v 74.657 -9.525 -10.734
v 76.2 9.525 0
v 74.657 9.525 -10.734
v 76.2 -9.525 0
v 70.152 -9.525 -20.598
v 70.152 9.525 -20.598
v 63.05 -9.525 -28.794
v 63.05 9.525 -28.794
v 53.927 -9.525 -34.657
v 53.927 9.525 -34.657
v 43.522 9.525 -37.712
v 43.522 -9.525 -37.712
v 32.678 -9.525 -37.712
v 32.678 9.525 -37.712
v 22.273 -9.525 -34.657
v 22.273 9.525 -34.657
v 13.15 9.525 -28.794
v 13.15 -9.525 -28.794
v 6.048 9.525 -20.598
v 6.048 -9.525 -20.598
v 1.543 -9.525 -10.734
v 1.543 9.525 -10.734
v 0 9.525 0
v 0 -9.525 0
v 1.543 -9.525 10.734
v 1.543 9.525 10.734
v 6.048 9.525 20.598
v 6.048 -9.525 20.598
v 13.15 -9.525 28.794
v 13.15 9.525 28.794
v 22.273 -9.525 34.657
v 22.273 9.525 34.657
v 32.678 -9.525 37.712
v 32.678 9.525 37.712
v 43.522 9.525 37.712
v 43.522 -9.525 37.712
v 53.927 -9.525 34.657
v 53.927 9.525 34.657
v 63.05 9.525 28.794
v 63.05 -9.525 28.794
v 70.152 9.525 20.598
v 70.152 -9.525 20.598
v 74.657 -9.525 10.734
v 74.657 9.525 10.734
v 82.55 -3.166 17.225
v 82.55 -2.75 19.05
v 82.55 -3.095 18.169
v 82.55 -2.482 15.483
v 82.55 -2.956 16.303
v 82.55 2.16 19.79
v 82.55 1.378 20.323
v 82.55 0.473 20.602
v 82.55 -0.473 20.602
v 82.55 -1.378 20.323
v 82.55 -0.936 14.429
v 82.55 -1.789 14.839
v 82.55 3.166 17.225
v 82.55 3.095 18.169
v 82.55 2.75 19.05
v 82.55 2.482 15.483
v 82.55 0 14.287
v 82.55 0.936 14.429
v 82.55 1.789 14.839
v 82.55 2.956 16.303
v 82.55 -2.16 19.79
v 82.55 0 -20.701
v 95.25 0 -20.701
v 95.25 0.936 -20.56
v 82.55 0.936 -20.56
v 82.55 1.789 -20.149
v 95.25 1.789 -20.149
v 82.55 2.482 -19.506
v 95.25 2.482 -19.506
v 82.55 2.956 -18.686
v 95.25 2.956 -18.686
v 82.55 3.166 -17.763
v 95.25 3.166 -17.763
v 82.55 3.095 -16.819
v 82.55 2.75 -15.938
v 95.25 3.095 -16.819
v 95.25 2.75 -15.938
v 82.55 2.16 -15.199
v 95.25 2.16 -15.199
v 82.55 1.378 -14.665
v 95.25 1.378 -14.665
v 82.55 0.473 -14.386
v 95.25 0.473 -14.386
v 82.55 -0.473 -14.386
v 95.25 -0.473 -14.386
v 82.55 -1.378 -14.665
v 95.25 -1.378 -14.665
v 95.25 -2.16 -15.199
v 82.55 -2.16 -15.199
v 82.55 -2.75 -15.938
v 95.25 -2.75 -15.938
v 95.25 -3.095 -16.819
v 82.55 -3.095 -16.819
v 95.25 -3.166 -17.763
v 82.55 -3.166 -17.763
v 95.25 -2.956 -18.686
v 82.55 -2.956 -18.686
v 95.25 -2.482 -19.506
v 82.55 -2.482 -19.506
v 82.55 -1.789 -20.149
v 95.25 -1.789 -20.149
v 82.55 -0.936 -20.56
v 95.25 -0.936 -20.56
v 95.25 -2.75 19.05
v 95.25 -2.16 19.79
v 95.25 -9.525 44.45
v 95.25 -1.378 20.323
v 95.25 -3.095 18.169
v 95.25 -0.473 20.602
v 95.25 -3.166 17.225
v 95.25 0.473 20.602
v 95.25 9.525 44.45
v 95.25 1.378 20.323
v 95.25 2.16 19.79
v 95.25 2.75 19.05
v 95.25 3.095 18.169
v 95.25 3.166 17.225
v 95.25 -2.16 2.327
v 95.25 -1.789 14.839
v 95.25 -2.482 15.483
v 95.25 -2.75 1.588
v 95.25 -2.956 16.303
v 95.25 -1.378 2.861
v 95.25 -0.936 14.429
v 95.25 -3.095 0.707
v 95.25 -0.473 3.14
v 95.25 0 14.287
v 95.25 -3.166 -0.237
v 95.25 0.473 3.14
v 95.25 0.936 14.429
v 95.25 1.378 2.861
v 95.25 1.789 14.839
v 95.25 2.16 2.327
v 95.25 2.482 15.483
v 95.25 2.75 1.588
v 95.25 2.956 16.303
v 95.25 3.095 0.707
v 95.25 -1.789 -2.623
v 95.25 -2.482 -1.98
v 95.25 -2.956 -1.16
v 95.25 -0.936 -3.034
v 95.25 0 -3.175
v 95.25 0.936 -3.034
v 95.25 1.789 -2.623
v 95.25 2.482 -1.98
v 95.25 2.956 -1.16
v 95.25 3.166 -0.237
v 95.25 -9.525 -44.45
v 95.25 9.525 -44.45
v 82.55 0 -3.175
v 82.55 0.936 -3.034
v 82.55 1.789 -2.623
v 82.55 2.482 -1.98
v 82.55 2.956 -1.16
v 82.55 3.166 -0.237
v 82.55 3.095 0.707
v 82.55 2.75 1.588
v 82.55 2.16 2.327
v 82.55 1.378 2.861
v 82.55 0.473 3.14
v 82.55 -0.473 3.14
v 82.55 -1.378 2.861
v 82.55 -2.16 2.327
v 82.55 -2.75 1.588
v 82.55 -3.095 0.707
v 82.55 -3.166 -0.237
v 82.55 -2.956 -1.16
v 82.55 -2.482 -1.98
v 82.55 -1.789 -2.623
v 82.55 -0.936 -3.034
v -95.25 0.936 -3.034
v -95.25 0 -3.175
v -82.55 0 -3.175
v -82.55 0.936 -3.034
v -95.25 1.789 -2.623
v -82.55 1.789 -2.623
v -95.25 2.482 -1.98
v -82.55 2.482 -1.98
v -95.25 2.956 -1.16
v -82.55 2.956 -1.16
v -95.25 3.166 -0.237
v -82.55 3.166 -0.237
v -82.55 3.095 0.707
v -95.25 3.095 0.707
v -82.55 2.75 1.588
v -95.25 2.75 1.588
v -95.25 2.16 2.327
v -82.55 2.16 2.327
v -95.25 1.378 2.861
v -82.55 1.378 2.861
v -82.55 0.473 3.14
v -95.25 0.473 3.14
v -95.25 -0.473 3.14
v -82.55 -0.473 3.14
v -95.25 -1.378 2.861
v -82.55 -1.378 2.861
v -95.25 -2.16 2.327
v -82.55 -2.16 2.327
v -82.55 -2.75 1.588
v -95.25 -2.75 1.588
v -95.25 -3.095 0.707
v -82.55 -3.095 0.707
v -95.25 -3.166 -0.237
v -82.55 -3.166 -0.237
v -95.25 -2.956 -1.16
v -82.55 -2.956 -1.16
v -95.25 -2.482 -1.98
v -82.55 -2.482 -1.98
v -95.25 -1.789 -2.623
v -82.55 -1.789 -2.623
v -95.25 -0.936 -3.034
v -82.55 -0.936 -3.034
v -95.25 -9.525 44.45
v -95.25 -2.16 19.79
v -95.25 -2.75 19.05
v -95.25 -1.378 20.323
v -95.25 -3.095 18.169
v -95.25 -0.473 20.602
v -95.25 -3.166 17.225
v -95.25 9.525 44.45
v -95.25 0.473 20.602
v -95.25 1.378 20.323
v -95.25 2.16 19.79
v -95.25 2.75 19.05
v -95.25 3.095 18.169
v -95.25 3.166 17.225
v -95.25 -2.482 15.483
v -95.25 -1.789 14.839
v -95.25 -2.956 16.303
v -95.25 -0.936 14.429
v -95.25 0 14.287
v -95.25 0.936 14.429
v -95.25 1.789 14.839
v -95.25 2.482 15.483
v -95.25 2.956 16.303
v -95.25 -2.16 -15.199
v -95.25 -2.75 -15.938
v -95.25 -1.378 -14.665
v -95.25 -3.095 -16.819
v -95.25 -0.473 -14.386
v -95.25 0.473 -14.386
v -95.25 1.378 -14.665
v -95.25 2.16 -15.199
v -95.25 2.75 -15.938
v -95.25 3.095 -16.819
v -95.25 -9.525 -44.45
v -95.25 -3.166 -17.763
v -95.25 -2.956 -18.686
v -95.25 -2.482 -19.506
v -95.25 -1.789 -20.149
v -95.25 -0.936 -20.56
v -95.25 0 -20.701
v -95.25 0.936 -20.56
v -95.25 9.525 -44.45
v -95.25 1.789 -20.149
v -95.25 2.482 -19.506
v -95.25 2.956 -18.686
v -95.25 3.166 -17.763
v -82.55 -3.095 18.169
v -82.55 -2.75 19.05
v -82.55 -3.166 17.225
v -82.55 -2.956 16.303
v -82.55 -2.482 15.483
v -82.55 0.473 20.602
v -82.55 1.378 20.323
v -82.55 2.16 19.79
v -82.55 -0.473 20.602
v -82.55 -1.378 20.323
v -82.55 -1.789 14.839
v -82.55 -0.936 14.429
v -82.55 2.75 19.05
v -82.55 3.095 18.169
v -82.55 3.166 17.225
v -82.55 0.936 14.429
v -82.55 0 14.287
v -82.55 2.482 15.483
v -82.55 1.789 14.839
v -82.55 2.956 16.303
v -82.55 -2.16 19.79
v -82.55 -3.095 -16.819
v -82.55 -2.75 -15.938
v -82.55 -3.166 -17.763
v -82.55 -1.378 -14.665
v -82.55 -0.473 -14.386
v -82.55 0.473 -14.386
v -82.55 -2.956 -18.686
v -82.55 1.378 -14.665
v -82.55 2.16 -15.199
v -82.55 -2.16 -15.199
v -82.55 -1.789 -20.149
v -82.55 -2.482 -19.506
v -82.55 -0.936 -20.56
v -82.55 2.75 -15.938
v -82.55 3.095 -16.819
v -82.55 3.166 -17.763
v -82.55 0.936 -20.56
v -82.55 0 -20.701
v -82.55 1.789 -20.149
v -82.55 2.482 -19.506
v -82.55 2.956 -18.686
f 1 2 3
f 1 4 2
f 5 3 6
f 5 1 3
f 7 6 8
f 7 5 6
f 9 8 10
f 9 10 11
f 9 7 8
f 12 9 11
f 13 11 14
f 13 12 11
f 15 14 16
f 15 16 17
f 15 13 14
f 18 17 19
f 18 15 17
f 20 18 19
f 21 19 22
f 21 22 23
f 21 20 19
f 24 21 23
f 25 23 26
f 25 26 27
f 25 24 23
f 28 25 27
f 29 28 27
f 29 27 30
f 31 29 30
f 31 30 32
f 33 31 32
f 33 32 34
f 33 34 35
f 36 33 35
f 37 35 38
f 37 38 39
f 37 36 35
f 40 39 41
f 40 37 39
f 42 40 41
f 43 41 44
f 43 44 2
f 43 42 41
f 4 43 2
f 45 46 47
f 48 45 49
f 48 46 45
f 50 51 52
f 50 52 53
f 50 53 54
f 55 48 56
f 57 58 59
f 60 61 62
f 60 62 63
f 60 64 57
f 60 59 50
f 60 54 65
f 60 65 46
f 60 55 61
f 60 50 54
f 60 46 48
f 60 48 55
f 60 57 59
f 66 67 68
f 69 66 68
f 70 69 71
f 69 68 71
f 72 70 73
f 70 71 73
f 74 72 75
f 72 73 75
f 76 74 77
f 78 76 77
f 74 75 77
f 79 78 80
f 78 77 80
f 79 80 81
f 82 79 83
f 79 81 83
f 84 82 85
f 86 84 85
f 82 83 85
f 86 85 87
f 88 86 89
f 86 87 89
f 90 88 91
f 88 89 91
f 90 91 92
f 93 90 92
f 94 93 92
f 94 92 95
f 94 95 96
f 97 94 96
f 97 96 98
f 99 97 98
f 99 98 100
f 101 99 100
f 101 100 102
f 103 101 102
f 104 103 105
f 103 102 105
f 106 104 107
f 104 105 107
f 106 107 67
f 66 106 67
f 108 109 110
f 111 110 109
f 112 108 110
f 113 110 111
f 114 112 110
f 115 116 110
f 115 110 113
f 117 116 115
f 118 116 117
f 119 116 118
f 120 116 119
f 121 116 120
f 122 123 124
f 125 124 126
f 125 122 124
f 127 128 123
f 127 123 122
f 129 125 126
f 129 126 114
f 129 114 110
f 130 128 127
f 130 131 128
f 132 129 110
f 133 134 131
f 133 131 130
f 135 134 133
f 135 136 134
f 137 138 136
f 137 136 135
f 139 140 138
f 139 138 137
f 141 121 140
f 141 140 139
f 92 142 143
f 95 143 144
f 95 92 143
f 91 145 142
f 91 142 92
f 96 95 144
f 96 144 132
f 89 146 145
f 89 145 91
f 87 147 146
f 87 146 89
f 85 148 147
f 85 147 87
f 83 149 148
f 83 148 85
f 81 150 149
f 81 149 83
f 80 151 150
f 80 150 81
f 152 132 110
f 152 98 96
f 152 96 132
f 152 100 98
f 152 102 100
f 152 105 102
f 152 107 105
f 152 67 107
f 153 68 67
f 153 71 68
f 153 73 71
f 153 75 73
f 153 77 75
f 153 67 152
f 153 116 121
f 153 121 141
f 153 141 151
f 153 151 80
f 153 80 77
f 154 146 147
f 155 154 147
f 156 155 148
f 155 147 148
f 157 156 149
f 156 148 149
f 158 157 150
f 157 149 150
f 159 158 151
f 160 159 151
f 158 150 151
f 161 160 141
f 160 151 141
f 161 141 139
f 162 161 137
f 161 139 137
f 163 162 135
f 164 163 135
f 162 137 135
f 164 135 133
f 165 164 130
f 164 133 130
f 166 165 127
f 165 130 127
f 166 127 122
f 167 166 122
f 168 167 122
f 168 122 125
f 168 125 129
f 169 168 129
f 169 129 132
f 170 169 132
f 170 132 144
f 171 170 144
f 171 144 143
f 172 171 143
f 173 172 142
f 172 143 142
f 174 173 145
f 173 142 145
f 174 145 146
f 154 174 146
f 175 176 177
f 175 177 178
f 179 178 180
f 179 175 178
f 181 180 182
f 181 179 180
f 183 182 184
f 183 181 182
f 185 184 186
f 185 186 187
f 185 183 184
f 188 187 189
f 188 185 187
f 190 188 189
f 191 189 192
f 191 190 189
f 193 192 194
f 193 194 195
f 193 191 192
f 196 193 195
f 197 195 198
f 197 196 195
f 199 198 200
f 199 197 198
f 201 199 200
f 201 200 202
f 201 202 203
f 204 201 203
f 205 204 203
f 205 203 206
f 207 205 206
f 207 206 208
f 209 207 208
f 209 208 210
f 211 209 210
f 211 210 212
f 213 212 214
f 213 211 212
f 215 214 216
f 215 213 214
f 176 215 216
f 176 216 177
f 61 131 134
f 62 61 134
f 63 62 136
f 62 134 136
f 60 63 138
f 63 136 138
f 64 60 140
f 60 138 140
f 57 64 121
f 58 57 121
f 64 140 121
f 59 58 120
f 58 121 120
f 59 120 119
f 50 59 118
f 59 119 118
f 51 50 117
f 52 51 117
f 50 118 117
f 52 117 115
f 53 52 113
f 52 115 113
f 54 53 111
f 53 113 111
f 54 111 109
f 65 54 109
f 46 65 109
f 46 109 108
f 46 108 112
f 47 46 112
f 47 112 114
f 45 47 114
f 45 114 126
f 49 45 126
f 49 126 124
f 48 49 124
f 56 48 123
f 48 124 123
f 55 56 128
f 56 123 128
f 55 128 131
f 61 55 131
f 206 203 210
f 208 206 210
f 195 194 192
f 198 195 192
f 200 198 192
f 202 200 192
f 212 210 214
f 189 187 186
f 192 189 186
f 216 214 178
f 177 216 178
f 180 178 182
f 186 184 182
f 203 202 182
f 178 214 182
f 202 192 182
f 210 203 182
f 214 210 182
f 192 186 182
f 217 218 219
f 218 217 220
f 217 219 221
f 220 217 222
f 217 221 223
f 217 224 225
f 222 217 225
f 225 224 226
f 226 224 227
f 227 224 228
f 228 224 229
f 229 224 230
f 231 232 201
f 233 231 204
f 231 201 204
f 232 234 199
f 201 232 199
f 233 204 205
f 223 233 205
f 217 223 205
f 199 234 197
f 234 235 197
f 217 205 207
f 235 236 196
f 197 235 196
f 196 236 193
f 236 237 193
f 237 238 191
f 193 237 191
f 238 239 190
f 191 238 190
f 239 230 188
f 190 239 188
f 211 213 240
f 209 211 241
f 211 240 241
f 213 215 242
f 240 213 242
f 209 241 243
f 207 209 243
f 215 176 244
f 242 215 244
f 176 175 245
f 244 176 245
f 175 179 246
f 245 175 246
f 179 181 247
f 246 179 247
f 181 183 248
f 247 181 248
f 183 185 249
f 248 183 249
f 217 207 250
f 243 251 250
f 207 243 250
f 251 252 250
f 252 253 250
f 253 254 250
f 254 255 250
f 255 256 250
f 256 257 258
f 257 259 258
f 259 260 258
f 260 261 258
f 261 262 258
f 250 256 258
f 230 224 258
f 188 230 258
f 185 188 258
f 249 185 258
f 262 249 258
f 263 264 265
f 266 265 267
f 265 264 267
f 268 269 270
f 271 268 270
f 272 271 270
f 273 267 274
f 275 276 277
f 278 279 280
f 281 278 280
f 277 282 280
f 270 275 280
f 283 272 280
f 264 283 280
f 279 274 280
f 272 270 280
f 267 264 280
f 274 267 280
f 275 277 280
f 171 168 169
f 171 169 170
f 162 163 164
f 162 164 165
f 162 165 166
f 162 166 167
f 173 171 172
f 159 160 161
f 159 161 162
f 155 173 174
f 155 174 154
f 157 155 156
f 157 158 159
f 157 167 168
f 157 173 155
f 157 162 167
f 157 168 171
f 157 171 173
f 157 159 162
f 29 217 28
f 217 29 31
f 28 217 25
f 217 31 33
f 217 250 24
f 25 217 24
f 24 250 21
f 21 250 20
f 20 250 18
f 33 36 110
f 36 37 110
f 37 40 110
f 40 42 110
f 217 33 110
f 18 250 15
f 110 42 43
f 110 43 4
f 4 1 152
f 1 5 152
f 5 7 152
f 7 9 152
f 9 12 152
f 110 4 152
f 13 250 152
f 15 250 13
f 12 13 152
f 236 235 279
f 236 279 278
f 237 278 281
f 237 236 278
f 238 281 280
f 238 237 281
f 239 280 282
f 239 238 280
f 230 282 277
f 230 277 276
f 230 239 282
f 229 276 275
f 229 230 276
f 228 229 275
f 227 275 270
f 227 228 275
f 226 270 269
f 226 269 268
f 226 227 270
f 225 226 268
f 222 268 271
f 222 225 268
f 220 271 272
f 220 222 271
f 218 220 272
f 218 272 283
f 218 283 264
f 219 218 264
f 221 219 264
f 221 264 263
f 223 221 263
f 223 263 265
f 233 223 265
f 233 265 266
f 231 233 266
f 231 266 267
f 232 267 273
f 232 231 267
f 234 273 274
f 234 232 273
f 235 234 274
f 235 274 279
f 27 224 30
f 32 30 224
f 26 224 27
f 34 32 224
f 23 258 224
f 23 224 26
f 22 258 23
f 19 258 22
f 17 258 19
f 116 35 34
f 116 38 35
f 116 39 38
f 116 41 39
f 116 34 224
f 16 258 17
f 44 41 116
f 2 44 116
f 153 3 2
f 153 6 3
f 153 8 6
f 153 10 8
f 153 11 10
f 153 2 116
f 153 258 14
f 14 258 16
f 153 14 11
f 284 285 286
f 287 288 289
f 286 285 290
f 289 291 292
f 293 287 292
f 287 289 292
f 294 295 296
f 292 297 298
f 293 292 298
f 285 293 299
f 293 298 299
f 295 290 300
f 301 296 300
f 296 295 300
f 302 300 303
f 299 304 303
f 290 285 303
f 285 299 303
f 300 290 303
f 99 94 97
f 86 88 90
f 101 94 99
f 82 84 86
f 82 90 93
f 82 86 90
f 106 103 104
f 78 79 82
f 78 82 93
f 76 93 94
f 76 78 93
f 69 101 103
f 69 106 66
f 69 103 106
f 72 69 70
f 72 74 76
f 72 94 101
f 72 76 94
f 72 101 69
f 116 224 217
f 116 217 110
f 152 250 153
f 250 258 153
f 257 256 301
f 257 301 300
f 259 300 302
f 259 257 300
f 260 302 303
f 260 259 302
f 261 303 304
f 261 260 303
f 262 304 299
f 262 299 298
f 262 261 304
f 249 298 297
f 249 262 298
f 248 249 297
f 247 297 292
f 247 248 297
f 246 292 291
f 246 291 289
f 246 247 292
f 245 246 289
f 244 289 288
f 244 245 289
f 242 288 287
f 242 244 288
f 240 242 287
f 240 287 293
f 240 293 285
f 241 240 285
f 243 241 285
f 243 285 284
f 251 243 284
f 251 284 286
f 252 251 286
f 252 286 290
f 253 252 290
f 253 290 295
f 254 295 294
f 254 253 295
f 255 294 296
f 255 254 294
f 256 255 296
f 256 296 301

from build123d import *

# Parameters (mm, degrees)
SKETCH1_W           = 190.5
SKETCH1_H           = 88.9
SKETCH1_R           = 38.1
BOSS_EXTRUDE1_DEPTH = 9.525
SKETCH2_R           = 3.175
CUT_EXTRUDE1_DEPTH  = 12.7


with BuildPart() as part:
    # Sketch1 → Boss-Extrude1 (new body, symmetric)
    with BuildSketch(Plane(origin=(0, 0, 0), x_dir=(1, 0, 0), z_dir=(0, 1, 0))):
        Rectangle(SKETCH1_W, SKETCH1_H)
        with Locations((38.1, 0)):
            Circle(SKETCH1_R, mode=Mode.SUBTRACT)
    extrude(amount=BOSS_EXTRUDE1_DEPTH, both=True)

    # Sketch2 → Cut-Extrude1 (cut)
    with BuildSketch(Plane(origin=(95.25, 0, 0), x_dir=(0, 0, -1), z_dir=(1, 0, 0))):
        Circle(SKETCH2_R)
        with Locations((17.526, 0)):
            Circle(SKETCH2_R)
        with Locations((-17.4625, 0)):
            Circle(SKETCH2_R)
    cut_extrude1 = extrude(amount=-CUT_EXTRUDE1_DEPTH, mode=Mode.SUBTRACT)

    # Mirror1: Cut-Extrude1 across plane
    add(cut_extrude1.mirror(Plane(origin=(0, 0, 0), x_dir=(0, 0, 1), z_dir=(1, 0, 0))), mode=Mode.SUBTRACT)


solid = part.part
